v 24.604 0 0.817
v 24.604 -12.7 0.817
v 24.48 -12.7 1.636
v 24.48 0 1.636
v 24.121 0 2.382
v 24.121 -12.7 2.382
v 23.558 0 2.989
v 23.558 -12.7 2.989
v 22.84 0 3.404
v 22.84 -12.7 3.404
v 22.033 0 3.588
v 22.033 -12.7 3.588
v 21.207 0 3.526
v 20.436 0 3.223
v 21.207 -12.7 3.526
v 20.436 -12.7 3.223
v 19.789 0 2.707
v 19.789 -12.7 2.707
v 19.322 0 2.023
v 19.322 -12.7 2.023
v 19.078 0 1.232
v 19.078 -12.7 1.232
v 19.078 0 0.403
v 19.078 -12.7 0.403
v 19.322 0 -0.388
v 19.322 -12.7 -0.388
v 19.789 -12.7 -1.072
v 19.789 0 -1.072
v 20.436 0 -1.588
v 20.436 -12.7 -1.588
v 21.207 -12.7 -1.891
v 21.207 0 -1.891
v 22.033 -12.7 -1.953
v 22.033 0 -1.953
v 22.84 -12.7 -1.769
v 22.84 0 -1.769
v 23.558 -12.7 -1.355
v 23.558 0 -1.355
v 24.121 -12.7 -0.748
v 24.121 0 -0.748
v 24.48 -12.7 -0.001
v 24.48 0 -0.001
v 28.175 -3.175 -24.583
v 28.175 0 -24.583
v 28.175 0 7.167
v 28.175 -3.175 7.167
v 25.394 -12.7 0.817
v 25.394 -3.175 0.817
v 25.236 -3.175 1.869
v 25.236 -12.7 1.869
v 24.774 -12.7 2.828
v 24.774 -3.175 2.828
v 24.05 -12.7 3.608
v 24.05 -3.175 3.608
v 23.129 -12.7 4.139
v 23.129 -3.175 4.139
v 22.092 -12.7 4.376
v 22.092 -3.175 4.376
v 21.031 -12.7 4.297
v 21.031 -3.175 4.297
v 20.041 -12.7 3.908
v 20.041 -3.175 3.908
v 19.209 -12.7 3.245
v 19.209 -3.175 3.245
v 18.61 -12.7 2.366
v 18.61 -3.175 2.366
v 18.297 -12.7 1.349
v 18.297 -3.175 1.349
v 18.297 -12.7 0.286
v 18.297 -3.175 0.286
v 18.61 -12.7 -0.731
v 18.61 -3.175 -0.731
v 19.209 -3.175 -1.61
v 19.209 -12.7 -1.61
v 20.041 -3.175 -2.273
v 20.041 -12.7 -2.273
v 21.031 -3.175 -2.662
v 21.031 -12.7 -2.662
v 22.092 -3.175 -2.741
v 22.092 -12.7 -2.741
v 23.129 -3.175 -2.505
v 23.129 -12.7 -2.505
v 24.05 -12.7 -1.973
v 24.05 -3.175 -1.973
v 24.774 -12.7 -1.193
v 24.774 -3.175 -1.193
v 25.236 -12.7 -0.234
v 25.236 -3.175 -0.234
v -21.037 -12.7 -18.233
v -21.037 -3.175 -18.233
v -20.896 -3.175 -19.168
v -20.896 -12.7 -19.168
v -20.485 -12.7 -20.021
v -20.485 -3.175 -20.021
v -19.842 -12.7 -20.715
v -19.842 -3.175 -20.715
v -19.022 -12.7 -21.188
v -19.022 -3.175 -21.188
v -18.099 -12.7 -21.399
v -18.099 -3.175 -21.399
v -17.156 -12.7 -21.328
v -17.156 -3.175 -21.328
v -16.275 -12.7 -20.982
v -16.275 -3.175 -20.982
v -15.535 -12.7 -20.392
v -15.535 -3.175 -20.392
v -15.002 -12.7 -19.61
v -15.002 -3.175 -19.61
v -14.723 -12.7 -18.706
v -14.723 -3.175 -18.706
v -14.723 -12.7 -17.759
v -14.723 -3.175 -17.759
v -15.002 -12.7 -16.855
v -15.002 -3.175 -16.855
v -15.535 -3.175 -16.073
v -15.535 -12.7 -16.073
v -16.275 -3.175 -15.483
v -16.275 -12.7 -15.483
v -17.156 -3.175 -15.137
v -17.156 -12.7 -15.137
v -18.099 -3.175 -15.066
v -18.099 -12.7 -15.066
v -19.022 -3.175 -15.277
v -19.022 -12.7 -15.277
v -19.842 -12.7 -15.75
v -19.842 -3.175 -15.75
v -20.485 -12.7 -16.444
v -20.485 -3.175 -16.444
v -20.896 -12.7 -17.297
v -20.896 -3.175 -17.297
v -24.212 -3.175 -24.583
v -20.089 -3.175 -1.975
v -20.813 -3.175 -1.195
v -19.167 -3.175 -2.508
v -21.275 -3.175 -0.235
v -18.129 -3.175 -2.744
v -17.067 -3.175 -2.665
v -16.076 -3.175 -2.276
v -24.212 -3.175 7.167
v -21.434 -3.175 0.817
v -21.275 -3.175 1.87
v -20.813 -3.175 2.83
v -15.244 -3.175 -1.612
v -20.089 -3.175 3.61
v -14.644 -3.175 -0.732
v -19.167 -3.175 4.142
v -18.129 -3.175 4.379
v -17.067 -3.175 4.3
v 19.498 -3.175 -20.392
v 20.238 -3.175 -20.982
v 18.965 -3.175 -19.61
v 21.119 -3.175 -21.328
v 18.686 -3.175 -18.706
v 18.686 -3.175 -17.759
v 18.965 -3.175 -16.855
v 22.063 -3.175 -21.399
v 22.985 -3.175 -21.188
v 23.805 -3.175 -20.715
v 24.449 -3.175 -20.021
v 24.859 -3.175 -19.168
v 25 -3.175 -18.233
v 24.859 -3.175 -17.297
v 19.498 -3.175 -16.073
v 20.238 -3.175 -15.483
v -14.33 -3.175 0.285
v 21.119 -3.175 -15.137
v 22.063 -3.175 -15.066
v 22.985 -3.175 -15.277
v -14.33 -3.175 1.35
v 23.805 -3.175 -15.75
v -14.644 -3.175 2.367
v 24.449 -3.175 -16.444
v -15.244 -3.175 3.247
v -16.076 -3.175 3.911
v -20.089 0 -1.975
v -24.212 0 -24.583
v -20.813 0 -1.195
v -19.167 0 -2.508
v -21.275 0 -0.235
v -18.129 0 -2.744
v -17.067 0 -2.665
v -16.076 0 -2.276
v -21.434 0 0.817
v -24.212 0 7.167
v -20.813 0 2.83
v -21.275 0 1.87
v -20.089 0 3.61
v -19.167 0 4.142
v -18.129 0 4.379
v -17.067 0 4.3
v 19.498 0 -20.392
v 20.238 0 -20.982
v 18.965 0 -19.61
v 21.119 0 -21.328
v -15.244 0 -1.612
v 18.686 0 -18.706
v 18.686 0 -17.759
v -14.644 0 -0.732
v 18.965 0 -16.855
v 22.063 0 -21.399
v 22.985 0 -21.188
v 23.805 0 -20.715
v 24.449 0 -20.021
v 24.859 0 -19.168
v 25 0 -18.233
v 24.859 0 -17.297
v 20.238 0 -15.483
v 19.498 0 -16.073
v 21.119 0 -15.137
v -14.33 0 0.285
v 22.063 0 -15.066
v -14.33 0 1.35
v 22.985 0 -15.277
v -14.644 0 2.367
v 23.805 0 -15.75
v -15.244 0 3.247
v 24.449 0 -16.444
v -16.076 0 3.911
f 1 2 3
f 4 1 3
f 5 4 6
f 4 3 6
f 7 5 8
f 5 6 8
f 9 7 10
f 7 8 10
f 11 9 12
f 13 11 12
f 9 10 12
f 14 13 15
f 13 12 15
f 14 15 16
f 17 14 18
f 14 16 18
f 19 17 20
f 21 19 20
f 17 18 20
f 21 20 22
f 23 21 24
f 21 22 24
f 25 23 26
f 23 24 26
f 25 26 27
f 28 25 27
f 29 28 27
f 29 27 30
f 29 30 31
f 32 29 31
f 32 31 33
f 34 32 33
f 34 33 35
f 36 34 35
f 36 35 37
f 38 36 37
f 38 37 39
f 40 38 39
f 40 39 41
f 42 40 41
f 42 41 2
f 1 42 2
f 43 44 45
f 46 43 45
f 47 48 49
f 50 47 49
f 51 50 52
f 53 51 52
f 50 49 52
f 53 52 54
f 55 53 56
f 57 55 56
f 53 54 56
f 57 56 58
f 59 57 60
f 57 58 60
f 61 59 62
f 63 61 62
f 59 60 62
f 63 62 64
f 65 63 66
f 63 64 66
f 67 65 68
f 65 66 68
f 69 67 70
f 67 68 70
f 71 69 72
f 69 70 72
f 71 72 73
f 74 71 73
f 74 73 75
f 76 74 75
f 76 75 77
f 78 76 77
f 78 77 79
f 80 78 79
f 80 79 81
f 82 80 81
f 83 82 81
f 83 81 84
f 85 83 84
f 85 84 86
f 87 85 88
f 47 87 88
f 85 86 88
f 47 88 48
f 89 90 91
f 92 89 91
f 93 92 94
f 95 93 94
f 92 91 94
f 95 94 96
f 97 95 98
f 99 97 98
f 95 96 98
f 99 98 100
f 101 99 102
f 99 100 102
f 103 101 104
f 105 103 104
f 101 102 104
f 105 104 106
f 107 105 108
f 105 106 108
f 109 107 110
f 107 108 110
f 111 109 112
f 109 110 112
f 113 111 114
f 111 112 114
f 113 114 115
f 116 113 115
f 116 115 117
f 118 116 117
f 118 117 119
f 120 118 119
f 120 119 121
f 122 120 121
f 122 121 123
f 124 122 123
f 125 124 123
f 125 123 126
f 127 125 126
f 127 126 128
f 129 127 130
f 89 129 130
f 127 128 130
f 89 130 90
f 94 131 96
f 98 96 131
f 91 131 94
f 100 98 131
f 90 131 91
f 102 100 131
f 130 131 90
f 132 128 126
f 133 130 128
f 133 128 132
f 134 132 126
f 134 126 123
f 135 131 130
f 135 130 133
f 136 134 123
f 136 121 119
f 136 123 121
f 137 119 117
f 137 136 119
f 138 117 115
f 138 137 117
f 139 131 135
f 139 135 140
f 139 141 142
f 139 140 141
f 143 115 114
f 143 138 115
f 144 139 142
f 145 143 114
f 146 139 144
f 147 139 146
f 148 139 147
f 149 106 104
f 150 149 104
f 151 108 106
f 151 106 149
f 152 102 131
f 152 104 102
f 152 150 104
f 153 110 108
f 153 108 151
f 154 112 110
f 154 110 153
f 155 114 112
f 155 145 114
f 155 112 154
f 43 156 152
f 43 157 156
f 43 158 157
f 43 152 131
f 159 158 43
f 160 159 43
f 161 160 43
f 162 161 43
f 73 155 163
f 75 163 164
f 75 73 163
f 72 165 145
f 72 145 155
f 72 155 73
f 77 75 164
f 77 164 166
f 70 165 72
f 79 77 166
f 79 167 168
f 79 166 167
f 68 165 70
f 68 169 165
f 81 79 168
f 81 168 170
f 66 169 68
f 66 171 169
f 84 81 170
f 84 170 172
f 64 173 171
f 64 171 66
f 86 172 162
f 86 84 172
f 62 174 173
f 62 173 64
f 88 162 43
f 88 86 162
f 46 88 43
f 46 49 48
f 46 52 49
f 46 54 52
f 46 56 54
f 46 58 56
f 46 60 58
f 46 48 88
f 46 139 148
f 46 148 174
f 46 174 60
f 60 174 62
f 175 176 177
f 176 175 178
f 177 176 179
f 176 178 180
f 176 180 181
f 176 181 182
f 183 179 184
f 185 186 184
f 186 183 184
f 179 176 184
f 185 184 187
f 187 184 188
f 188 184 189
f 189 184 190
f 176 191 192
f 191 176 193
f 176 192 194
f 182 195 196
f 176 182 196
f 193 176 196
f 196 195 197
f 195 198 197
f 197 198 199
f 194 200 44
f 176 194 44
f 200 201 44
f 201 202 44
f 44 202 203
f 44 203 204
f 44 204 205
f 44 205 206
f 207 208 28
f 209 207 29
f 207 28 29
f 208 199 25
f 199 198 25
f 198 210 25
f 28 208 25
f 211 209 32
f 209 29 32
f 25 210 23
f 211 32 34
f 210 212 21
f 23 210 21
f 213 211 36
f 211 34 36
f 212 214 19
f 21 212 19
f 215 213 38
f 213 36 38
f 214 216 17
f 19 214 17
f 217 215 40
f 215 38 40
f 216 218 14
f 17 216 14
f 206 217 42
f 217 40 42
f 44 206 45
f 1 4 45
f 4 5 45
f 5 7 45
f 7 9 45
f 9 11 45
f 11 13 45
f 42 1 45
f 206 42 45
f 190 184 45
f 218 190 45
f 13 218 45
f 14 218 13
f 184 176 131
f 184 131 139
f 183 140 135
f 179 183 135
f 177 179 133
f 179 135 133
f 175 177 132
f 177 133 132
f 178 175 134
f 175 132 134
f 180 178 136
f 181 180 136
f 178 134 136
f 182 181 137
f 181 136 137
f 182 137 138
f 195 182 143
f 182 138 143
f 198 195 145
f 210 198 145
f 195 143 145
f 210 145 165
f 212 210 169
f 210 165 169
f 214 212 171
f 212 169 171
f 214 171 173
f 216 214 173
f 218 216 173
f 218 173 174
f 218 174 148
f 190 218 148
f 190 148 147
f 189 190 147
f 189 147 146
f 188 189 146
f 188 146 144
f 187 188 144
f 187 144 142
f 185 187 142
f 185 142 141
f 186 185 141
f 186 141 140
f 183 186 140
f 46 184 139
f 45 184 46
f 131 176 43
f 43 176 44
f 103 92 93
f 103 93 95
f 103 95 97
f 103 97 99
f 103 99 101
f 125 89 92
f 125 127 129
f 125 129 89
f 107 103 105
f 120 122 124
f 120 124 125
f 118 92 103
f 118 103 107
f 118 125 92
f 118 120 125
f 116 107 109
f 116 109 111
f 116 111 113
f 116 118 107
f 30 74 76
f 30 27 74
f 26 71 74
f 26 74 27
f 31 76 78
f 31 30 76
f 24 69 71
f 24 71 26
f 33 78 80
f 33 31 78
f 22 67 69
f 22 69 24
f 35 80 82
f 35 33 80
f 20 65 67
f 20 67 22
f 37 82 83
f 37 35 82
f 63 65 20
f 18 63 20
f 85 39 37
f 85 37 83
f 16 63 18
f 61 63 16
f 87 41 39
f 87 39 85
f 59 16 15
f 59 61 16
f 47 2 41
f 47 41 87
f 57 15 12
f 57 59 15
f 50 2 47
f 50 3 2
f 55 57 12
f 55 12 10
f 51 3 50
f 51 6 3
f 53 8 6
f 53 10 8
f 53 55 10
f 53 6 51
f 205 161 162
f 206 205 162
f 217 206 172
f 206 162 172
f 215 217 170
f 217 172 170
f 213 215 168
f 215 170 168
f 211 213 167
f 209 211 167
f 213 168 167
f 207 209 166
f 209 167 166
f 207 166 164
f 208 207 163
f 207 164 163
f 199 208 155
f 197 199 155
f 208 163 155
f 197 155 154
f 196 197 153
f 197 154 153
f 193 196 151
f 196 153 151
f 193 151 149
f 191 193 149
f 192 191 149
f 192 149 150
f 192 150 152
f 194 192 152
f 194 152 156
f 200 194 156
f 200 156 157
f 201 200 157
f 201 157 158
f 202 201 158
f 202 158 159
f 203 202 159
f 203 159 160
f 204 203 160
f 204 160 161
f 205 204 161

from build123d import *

# Parameters (mm, degrees)
F0_W      = 52.3875
F0_H      = 31.75
F1_DEPTH  = 3.175
F3_DEPTH  = 3.176
F4_R      = 3.5687
F5_DEPTH  = 9.525
F6_R      = 2.778125
F7_DEPTH  = 12.701
F9_DEPTH  = 9.525
F10_R     = 3.175
F11_DEPTH = 3.176


with BuildPart() as f1:
    # F0 (on Front) → F1 (new body)
    with BuildSketch(Plane.XZ):
        with Locations((1.981661, -8.707554)):
            Rectangle(F0_W, F0_H)
    extrude(amount=F1_DEPTH)

    # F2 (on face) → F3 (cut, through all)
    with BuildSketch(Plane.XZ.offset(3.175)):
        with BuildLine():
            ThreePointArc((-14.290214, 0.817446), (-17.862089, 4.389321), (-21.433964, 0.817446))
            ThreePointArc((-21.433964, 0.817446), (-17.862089, -2.754429), (-14.290214, 0.817446))
        make_face()
    extrude(amount=-F3_DEPTH, mode=Mode.SUBTRACT)

    # F4 (on face) → F5 (join)
    with BuildSketch(Plane.XZ.offset(3.175)):
        with Locations((21.825411, 0.817446)):
            Circle(F4_R)
    extrude(amount=F5_DEPTH)

    # F6 (on face) → F7 (cut, through all)
    with BuildSketch(Plane.XZ.offset(12.7)):
        with Locations((21.825411, 0.817446)):
            Circle(F6_R)
    extrude(amount=-F7_DEPTH, mode=Mode.SUBTRACT)

    # F8 (on face) → F9 (join)
    with BuildSketch(Plane.XZ.offset(3.175)):
        with BuildLine():
            ThreePointArc((-14.687089, -18.232554), (-17.862089, -15.057554), (-21.037089, -18.232554))
            ThreePointArc((-21.037089, -18.232554), (-17.862089, -21.407554), (-14.687089, -18.232554))
        make_face()
    extrude(amount=F9_DEPTH)

    # F10 (on face) → F11 (cut, through all)
    with BuildSketch(Plane.XZ.offset(3.175)):
        with Locations((21.825411, -18.232554)):
            Circle(F10_R)
    extrude(amount=-F11_DEPTH, mode=Mode.SUBTRACT)


solid = f1.part
